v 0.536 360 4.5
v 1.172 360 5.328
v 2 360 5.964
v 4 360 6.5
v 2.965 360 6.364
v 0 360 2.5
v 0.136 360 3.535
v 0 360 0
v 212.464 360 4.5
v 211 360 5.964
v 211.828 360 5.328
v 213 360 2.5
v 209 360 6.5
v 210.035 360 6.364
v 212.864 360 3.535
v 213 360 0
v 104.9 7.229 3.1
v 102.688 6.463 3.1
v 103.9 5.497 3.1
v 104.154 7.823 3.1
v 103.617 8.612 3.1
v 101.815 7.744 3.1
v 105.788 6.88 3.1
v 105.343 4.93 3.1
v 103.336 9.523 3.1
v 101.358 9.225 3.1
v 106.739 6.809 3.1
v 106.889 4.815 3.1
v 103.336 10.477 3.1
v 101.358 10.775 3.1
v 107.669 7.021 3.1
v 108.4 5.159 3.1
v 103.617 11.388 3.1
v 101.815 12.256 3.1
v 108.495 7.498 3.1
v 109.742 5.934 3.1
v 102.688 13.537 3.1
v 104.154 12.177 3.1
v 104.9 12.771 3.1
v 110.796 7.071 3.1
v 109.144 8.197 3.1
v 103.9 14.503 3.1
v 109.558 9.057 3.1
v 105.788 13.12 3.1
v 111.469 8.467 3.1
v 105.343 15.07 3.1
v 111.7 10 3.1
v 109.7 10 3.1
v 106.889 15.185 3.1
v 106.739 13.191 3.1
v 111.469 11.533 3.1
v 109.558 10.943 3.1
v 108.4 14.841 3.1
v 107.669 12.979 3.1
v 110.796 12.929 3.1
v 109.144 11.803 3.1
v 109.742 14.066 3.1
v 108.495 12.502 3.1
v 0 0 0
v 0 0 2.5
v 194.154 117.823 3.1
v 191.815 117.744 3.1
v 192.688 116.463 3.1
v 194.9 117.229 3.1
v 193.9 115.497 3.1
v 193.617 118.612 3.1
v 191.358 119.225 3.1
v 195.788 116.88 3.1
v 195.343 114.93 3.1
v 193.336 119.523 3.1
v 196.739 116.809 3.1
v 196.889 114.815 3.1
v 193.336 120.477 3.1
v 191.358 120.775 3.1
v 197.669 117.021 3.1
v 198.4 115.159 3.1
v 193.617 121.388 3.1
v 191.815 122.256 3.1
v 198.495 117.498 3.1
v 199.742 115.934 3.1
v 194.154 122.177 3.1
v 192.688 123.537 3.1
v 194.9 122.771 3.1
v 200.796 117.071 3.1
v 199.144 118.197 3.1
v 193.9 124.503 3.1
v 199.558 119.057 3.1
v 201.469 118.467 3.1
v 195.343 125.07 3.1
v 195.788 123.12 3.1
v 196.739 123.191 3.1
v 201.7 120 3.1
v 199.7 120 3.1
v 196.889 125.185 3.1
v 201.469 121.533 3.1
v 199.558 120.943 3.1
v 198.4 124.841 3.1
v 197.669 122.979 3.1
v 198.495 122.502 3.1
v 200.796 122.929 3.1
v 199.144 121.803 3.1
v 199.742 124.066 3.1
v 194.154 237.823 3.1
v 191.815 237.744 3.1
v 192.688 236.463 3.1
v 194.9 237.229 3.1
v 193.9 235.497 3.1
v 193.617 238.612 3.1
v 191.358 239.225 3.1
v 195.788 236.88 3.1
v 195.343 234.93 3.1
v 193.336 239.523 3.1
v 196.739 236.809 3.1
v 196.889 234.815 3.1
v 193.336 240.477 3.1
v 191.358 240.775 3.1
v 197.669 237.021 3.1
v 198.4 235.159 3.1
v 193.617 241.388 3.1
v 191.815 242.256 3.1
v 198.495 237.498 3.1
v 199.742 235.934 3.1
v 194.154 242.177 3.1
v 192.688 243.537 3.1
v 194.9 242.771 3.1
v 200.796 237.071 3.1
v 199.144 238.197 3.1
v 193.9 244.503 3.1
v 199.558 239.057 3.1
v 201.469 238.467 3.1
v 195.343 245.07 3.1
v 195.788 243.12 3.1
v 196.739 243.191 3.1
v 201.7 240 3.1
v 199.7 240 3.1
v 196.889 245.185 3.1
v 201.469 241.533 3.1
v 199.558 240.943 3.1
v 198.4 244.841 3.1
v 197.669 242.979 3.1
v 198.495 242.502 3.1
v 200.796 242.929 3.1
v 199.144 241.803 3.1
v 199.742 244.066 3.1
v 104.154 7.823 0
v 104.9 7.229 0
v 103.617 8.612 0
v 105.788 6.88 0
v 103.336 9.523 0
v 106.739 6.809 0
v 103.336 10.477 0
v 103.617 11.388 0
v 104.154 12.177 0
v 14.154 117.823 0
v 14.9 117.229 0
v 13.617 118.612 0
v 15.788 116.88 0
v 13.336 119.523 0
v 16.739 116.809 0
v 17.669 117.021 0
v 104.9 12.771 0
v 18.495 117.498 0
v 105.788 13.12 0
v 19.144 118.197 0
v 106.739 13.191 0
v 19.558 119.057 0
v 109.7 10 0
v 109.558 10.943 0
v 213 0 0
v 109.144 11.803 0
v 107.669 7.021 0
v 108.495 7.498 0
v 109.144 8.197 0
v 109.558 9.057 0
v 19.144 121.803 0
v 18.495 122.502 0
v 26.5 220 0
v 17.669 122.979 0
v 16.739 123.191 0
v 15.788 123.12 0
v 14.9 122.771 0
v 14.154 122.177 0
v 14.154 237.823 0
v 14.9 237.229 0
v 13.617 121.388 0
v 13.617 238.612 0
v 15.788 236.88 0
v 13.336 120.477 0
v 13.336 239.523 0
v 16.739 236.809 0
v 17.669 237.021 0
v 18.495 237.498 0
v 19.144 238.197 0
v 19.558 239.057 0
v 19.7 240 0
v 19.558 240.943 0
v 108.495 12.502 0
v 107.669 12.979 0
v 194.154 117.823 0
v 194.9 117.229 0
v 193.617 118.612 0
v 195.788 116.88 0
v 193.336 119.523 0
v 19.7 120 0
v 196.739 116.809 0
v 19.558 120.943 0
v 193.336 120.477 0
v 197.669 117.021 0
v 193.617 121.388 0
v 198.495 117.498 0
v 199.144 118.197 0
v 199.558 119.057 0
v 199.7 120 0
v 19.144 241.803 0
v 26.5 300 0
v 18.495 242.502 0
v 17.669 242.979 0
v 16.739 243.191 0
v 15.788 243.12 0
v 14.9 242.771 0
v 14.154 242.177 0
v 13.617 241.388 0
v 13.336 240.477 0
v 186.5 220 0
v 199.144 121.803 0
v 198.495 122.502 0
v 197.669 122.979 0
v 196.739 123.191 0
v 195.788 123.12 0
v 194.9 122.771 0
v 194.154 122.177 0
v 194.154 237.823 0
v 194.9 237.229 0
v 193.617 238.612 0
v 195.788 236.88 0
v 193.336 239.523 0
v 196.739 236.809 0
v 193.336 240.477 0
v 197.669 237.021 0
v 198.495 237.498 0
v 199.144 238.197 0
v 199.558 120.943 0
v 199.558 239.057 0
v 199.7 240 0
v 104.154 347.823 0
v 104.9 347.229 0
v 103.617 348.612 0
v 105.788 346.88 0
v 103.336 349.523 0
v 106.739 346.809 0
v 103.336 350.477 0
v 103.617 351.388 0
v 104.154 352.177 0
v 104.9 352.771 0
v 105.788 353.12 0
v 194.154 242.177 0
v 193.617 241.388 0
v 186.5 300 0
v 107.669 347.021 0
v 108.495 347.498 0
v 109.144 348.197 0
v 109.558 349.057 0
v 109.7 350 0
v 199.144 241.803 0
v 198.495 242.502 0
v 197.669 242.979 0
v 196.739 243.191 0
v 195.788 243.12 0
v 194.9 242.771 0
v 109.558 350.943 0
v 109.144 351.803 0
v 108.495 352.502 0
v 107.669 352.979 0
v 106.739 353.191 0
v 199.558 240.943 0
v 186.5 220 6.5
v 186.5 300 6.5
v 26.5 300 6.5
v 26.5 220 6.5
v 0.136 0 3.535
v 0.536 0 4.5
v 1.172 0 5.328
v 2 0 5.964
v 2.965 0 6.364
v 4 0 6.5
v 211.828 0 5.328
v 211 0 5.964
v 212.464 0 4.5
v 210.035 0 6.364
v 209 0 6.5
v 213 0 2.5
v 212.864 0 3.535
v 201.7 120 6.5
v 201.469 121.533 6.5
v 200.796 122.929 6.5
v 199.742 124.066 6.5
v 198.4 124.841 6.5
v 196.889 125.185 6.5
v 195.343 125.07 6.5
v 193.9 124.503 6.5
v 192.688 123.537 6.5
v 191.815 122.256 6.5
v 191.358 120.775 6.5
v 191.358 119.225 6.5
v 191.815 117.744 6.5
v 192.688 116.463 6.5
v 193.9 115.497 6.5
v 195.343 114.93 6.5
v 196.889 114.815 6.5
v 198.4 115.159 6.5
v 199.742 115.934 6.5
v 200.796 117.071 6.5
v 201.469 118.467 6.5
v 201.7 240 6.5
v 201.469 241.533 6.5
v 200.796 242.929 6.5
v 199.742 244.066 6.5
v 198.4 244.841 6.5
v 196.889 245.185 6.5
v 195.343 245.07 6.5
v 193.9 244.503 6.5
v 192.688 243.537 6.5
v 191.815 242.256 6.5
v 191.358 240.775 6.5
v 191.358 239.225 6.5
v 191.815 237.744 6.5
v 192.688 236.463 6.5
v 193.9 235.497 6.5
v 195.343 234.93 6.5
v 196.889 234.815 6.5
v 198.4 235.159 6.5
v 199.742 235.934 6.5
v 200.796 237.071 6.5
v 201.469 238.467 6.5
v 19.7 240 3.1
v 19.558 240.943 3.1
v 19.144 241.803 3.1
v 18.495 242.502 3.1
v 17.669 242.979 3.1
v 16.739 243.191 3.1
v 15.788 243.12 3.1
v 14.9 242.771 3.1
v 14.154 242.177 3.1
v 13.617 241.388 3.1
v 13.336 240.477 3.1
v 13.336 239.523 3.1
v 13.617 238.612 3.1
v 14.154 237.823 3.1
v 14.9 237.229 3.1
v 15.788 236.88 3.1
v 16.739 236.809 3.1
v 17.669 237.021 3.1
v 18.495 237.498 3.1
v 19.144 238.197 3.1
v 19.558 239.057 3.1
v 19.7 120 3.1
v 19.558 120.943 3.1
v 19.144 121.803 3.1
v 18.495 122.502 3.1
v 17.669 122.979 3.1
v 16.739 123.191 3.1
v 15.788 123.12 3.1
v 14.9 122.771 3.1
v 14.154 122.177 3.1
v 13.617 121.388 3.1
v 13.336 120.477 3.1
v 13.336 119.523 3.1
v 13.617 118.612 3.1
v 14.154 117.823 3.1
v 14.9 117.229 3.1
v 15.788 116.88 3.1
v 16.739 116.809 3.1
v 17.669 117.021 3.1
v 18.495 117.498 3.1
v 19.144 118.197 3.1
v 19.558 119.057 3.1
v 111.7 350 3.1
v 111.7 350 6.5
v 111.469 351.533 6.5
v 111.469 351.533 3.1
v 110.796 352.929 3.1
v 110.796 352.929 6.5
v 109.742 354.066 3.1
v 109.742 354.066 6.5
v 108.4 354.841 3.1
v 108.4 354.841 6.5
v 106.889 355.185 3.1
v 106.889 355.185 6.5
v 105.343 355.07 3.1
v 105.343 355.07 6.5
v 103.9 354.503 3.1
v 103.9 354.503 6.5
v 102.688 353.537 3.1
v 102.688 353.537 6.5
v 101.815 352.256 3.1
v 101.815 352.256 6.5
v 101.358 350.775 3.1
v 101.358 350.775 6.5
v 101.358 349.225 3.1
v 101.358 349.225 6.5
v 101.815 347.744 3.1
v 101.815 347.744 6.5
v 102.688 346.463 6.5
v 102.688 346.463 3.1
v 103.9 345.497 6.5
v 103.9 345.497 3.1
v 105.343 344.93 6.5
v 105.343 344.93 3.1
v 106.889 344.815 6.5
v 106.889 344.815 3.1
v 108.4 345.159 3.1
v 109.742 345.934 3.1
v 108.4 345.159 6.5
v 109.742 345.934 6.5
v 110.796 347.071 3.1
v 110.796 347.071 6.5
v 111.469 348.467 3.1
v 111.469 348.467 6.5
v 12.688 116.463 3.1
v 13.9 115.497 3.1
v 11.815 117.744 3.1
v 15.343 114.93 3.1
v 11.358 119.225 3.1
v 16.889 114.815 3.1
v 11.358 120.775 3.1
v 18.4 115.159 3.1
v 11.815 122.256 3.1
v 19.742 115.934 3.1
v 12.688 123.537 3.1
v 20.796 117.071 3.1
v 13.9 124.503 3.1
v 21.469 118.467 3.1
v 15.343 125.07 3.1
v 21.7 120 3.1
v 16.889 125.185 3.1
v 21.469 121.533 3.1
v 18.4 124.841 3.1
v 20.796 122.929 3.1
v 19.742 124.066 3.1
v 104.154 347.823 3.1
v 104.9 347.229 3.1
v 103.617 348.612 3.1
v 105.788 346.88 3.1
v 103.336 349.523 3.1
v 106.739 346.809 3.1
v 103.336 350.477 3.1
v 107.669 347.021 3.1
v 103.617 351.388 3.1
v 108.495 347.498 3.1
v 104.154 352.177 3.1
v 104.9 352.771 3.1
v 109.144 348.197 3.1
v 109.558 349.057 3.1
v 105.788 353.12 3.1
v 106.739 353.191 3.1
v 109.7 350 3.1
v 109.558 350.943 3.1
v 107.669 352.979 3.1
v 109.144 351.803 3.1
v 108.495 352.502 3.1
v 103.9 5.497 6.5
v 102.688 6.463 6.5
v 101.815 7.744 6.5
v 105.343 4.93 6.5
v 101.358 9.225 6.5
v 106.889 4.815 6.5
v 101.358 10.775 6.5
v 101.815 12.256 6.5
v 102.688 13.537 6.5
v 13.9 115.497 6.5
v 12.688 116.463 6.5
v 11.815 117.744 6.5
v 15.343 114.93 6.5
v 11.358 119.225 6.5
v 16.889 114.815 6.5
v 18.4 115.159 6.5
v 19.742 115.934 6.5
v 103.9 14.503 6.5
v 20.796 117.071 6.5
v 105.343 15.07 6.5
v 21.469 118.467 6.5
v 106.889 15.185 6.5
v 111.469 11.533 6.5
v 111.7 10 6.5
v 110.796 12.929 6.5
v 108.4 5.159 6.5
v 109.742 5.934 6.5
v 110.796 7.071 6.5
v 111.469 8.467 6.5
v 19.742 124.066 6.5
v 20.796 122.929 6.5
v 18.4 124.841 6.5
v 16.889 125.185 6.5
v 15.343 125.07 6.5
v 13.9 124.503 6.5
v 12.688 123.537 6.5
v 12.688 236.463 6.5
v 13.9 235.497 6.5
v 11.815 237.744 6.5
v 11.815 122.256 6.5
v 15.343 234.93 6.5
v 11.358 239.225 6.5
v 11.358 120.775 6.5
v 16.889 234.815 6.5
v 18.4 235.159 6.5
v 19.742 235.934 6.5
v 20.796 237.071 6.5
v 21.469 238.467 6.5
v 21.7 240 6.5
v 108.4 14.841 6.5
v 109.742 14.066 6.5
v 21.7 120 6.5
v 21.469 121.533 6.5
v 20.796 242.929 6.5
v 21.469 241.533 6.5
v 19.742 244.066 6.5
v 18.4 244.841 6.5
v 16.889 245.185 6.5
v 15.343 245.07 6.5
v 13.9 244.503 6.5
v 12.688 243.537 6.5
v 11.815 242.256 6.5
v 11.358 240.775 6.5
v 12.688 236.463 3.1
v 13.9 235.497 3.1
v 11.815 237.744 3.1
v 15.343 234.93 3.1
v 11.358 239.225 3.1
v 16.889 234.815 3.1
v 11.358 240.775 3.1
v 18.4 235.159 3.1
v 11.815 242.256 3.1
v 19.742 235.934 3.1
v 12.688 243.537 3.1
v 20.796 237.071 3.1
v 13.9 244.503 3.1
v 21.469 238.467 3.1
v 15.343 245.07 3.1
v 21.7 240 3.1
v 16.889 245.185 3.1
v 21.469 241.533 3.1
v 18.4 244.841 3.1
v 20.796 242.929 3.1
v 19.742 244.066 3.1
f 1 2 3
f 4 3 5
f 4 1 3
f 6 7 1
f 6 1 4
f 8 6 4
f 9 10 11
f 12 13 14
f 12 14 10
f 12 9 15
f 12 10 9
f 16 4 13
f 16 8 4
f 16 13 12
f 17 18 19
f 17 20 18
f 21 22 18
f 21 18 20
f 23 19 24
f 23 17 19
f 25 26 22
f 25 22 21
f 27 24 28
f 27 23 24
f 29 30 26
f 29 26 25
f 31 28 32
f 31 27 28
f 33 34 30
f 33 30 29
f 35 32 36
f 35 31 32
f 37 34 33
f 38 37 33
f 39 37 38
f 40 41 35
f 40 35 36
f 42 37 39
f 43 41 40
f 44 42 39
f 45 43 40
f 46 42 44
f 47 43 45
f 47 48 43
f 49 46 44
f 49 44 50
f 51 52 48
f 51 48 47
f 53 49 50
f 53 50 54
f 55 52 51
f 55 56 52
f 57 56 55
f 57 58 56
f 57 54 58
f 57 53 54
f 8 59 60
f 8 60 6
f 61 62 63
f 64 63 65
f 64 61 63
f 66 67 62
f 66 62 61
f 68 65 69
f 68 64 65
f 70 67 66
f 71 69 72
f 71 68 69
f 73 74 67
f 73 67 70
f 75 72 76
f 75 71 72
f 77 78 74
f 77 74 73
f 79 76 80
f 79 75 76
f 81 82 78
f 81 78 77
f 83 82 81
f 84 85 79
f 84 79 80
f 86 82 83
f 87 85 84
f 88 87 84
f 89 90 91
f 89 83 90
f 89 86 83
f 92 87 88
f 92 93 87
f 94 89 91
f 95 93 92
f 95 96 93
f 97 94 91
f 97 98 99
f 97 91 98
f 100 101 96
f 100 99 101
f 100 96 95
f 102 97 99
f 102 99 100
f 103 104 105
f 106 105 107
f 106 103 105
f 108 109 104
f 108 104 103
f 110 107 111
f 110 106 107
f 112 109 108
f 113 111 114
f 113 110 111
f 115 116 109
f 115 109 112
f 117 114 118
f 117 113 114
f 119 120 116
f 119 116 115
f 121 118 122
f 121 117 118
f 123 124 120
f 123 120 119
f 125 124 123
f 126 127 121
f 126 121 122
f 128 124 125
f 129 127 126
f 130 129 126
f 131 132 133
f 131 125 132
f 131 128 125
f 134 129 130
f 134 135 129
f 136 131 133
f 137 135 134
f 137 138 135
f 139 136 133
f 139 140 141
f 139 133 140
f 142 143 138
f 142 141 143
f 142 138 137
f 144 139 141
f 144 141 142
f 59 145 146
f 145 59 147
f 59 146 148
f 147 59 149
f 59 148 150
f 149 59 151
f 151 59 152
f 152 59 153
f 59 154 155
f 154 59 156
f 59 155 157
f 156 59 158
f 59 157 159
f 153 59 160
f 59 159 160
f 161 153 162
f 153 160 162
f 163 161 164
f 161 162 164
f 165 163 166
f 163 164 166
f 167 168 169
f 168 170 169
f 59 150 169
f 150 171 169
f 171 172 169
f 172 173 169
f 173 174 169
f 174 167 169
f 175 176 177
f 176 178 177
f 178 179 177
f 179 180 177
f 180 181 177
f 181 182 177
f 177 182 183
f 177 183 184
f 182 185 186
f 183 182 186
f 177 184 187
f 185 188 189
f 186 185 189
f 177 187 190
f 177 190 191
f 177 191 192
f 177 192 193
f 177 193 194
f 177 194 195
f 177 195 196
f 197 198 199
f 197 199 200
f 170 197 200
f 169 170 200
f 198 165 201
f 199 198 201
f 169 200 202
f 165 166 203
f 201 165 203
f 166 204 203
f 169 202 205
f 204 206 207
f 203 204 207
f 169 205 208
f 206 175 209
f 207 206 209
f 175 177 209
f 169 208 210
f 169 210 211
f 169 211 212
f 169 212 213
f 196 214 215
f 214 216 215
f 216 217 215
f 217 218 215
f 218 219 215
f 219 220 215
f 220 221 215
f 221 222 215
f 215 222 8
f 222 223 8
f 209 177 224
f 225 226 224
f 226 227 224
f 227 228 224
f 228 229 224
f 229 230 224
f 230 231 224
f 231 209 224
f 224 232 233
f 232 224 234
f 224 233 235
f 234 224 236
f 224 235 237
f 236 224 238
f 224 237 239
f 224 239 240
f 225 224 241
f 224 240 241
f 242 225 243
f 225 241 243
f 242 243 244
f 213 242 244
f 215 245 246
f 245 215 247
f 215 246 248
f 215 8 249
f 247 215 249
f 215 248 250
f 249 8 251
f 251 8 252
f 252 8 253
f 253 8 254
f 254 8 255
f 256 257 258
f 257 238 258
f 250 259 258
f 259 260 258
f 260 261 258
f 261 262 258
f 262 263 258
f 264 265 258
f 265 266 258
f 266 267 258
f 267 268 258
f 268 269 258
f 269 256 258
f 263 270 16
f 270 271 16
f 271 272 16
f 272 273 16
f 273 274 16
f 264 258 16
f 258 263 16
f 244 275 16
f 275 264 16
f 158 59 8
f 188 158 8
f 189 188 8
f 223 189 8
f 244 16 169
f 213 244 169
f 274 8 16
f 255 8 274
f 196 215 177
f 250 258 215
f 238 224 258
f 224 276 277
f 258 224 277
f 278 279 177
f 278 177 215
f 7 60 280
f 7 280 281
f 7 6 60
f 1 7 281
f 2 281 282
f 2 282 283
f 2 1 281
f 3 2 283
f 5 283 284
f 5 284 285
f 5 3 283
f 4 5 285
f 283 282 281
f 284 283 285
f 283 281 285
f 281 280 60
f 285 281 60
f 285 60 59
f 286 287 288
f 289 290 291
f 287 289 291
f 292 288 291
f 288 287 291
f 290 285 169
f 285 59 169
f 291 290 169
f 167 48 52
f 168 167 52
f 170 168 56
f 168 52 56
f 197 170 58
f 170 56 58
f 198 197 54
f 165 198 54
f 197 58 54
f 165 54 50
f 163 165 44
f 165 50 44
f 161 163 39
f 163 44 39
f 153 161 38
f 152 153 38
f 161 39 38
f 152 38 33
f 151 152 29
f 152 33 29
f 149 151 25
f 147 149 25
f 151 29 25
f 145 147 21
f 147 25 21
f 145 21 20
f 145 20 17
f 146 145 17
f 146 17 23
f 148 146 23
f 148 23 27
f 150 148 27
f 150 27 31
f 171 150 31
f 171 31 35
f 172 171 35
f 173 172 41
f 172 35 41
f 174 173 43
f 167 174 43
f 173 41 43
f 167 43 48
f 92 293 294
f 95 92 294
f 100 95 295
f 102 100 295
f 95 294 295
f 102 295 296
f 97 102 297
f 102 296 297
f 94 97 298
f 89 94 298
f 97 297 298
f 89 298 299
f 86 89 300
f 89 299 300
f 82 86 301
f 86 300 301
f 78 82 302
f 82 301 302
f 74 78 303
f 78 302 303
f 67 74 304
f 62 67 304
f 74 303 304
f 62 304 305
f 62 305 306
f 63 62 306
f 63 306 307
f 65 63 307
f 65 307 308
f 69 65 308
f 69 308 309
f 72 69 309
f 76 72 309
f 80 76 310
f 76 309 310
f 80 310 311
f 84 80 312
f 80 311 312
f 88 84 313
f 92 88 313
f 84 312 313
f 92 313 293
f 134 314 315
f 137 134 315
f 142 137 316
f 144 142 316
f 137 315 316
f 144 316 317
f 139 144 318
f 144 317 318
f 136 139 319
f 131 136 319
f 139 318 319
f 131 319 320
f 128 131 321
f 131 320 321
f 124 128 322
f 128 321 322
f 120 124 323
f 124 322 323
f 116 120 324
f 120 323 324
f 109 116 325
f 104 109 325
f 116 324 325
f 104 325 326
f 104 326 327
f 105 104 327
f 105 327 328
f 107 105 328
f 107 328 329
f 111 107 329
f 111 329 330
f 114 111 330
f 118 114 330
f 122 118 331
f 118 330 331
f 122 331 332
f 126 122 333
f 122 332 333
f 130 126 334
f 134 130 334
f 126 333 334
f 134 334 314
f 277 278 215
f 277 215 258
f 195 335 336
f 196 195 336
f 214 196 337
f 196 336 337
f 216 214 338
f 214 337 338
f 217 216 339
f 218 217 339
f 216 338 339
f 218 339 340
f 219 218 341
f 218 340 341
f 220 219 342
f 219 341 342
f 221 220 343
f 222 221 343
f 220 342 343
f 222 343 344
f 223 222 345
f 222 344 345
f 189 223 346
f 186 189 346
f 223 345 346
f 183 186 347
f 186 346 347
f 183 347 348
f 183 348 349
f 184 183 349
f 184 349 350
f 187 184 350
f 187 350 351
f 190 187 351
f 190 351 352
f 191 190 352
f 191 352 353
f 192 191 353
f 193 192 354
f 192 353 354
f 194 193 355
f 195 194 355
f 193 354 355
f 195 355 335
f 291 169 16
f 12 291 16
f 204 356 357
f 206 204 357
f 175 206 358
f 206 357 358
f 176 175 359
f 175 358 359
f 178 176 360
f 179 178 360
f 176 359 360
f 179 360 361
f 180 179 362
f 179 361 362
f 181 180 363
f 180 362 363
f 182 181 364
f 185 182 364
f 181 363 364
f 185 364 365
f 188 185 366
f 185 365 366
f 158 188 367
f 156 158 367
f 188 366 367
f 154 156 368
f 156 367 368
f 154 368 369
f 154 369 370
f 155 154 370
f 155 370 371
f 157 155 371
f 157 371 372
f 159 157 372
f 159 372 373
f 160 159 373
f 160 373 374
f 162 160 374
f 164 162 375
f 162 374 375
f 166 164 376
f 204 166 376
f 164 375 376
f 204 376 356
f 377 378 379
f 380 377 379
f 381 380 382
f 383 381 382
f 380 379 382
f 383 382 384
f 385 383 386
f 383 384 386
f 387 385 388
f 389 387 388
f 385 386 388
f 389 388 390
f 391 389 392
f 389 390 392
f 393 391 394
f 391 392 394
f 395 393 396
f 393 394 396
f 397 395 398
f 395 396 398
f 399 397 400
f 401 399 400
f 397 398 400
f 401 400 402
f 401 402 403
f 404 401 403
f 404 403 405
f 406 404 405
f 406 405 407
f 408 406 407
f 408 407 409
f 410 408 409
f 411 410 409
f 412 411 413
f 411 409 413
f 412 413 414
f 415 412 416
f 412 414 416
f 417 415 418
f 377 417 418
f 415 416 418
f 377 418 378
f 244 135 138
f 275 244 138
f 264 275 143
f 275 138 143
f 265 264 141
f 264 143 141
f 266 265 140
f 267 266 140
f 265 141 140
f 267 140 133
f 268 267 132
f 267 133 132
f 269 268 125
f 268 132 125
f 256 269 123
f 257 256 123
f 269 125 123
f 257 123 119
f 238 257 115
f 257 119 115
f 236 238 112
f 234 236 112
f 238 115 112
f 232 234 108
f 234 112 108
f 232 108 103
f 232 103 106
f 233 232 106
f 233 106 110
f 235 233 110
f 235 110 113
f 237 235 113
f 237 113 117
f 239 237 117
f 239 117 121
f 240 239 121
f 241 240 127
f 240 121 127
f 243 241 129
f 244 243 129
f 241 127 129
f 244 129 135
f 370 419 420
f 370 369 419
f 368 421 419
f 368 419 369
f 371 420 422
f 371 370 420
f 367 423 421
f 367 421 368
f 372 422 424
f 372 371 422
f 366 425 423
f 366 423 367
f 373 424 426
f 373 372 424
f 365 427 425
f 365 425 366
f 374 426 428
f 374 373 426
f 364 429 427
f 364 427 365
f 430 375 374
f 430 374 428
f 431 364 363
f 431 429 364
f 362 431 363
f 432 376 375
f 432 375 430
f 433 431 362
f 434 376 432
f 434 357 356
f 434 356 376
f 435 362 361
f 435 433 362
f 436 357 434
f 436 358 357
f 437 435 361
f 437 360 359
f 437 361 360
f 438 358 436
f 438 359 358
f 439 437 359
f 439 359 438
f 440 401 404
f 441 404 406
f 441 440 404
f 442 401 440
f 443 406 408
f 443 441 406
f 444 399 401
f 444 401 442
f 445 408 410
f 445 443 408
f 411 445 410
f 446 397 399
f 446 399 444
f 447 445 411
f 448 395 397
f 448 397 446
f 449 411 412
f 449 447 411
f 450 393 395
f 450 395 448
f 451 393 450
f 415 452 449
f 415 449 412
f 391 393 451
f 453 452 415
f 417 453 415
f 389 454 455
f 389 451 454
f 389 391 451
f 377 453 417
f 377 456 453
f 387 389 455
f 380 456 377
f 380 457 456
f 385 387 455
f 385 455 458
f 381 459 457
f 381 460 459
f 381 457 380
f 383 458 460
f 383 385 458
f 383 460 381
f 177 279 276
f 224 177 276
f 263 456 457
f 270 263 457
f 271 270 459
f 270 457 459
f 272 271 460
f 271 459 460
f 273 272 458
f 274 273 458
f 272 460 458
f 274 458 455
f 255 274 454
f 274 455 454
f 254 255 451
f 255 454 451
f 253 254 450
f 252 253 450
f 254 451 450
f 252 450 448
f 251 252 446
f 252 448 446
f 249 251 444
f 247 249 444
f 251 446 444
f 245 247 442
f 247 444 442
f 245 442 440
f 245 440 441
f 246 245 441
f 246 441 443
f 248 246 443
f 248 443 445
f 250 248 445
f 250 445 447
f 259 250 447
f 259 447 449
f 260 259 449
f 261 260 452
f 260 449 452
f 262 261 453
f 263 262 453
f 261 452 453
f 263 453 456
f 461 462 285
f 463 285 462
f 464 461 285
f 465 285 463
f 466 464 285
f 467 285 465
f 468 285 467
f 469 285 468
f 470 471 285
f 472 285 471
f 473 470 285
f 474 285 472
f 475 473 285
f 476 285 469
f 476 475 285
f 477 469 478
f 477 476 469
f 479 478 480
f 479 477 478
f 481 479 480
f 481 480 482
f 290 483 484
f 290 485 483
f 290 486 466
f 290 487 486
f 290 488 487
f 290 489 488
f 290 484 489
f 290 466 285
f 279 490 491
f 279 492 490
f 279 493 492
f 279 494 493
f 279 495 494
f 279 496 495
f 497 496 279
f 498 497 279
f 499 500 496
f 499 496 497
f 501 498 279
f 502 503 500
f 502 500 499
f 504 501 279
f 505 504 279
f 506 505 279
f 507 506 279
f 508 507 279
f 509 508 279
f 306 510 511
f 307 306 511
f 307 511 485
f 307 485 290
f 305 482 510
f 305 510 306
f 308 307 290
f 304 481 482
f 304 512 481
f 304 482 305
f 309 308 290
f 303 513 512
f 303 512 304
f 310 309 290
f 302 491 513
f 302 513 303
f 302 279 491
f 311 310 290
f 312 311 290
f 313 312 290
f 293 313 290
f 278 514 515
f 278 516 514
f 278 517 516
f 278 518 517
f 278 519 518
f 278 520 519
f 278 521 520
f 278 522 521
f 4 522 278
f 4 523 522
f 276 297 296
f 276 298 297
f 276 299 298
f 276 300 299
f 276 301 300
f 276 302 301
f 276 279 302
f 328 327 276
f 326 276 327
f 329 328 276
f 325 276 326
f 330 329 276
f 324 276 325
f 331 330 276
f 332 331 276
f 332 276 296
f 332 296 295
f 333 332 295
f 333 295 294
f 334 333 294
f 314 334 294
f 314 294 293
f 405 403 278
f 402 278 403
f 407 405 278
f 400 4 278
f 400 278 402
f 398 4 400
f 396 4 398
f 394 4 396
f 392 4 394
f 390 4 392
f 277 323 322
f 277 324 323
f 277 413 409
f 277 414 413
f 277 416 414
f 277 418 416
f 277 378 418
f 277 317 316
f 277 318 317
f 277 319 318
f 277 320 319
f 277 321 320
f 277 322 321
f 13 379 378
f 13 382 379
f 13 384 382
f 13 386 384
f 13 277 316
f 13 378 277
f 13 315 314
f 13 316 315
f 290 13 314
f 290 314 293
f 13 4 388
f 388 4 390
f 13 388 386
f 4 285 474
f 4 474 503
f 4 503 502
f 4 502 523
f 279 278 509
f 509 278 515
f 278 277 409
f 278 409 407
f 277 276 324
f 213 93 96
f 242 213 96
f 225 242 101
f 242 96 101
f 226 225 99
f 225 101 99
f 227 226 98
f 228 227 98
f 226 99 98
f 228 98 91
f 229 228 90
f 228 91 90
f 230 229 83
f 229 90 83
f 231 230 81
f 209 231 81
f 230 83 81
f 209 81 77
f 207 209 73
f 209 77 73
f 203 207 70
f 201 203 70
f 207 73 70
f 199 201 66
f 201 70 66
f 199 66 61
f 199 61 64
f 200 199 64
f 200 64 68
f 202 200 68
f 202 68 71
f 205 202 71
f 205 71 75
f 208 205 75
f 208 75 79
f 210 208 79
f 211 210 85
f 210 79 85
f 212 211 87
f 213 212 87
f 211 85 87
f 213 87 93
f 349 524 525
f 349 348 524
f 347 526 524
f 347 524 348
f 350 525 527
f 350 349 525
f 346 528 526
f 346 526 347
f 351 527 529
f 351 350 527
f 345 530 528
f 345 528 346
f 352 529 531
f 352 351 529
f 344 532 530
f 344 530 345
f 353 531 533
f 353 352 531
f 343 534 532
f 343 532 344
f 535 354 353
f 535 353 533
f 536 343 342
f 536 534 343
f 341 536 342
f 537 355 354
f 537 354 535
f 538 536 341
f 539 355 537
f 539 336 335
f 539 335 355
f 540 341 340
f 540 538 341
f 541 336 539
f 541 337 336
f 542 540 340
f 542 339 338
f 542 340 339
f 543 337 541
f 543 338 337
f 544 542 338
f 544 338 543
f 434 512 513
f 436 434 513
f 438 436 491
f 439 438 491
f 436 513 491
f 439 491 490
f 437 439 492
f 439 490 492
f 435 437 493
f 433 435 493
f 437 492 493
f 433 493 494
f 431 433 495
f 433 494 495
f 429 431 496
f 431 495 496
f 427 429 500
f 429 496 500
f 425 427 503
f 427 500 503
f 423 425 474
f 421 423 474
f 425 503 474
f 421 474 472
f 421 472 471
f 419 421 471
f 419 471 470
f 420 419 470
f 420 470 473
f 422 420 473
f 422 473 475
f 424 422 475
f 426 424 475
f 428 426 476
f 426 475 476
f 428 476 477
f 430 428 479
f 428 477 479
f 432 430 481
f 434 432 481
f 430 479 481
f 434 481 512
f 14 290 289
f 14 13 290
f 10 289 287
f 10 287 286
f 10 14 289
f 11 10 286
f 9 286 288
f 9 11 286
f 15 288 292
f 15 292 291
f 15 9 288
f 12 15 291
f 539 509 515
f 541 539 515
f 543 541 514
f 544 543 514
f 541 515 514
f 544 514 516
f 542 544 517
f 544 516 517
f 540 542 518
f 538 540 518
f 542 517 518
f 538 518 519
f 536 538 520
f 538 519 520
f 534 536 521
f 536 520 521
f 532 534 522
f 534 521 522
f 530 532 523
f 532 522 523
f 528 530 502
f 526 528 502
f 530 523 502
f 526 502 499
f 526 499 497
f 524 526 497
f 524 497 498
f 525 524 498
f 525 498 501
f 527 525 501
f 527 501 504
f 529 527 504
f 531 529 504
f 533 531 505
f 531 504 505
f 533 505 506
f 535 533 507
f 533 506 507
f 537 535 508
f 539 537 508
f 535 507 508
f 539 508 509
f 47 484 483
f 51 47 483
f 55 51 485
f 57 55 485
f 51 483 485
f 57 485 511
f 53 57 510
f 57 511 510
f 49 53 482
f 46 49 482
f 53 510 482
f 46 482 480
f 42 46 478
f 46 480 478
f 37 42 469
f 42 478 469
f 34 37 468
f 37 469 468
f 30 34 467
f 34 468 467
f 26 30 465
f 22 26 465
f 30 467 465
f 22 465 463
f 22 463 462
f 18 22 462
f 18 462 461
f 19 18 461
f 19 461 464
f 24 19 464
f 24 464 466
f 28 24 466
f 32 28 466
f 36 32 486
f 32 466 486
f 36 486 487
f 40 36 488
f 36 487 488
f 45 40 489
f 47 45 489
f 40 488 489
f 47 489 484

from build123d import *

# Parameters (mm, degrees)
SKETCH_W        = 213
SKETCH_H        = 360
PAD_DEPTH       = 6.5
SKETCH001_R     = 5.2
POCKET_DEPTH    = 3.4
SKETCH002_R     = 3.2
POCKET001_DEPTH = 3.1
FILLET_R        = 4
SKETCH003_W     = 160
SKETCH003_H     = 80
POCKET002_DEPTH = 6.5


with BuildPart() as part:
    # Sketch → Pad (new body)
    with BuildSketch(Plane.XY):
        with Locations((106.5, 180)):
            Rectangle(SKETCH_W, SKETCH_H)
    extrude(amount=PAD_DEPTH)

    # Sketch001 (on Face6 of Pad) → Pocket (cut)
    with BuildSketch(Plane.XY.offset(6.5)):
        with Locations((106.5, 350)):
            Circle(SKETCH001_R)
        with Locations((16.5, 240)):
            Circle(SKETCH001_R)
        with Locations((16.5, 120)):
            Circle(SKETCH001_R)
        with Locations((196.5, 240)):
            Circle(SKETCH001_R)
        with Locations((196.5, 120)):
            Circle(SKETCH001_R)
        with Locations((106.5, 10)):
            Circle(SKETCH001_R)
    extrude(amount=-POCKET_DEPTH, mode=Mode.SUBTRACT)

    # Sketch002 (on Face17 of Pocket) → Pocket001 (cut)
    with BuildSketch(Plane.XY.offset(3.1)):
        with Locations((106.5, 350)):
            Circle(SKETCH002_R)
        with Locations((16.5, 240)):
            Circle(SKETCH002_R)
        with Locations((16.5, 120)):
            Circle(SKETCH002_R)
        with Locations((196.5, 240)):
            Circle(SKETCH002_R)
        with Locations((196.5, 120)):
            Circle(SKETCH002_R)
        with Locations((106.5, 10)):
            Circle(SKETCH002_R)
    extrude(amount=-POCKET001_DEPTH, mode=Mode.SUBTRACT)

    # Fillet
    fillet_edges = [part.edges().sort_by_distance(p)[0] for p in [
        (213, 180, 6.5),
        (0, 180, 6.5),
    ]]
    fillet(fillet_edges, radius=FILLET_R)

    # Sketch003 (on Face5 of Fillet) → Pocket002 (cut)
    with BuildSketch(Plane.XY.offset(6.5)):
        with Locations((106.5, 260)):
            Rectangle(SKETCH003_W, SKETCH003_H)
    extrude(amount=-POCKET002_DEPTH, mode=Mode.SUBTRACT)


solid = part.part
